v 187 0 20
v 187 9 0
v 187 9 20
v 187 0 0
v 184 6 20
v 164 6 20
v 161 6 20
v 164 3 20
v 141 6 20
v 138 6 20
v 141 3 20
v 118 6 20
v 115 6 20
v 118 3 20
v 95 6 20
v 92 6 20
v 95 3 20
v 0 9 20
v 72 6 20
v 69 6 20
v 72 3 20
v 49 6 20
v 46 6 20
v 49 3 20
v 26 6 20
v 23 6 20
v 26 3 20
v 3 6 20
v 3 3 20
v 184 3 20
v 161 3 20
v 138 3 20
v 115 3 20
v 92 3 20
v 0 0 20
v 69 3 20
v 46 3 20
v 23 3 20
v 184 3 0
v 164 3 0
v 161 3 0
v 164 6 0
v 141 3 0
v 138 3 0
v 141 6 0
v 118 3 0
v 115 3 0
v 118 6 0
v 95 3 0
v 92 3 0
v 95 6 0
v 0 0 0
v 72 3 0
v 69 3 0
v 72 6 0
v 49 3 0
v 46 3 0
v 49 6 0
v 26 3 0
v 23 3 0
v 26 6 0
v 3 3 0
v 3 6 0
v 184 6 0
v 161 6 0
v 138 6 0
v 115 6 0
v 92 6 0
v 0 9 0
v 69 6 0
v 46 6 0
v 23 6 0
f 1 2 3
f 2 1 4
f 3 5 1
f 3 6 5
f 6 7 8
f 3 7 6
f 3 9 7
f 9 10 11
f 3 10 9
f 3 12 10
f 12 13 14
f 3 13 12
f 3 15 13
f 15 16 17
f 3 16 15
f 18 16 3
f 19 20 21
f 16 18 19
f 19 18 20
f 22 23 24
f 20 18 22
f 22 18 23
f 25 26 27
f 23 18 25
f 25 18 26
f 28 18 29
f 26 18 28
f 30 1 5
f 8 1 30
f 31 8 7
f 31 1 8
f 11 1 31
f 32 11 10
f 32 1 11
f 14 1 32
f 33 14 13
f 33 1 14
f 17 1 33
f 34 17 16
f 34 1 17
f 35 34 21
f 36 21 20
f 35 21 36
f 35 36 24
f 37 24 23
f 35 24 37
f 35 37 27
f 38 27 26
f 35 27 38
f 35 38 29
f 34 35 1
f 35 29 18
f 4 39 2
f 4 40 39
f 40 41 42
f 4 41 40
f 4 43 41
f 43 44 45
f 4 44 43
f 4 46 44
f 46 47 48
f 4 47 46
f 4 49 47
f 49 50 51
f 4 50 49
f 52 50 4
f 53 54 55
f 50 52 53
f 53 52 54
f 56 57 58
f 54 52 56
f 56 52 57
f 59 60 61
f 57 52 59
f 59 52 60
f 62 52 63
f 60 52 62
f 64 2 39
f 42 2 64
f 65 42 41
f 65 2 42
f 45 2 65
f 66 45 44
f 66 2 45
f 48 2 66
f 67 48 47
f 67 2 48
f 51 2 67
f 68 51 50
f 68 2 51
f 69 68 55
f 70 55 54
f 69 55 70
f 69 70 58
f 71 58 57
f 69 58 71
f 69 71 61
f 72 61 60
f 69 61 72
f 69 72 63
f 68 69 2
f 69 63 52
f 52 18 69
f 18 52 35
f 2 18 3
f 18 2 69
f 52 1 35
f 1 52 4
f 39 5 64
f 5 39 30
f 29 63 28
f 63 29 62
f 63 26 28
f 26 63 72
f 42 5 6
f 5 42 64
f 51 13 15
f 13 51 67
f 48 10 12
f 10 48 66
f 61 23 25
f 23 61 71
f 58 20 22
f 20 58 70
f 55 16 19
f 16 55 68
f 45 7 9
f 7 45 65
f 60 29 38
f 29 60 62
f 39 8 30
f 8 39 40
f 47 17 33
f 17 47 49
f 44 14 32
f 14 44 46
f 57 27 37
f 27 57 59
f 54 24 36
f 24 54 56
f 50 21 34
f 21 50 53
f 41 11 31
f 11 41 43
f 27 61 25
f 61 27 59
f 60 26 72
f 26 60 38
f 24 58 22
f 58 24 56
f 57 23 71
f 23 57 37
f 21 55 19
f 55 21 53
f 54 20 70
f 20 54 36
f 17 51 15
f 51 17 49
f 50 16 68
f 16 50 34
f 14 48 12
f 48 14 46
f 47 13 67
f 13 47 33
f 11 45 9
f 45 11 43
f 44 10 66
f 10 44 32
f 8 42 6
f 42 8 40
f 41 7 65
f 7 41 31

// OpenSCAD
$fn = 128;

slot_h = 20;
slot_w = 3;
th = 3;

steak_knife_th = 2;
steak_knife_w = 20;
steak_knife_count = 8;

difference() {
  cube([th + (steak_knife_w + th) * steak_knife_count, th + slot_w + th, slot_h]);
  translate([th, th, -1])
    cube([(steak_knife_w + th) * steak_knife_count - th, slot_w, slot_h+2]);
}
for (i = [1:steak_knife_count-1]) {
  translate([(th + steak_knife_w) * i, th])
    cube([th, slot_w, slot_h]);
}
